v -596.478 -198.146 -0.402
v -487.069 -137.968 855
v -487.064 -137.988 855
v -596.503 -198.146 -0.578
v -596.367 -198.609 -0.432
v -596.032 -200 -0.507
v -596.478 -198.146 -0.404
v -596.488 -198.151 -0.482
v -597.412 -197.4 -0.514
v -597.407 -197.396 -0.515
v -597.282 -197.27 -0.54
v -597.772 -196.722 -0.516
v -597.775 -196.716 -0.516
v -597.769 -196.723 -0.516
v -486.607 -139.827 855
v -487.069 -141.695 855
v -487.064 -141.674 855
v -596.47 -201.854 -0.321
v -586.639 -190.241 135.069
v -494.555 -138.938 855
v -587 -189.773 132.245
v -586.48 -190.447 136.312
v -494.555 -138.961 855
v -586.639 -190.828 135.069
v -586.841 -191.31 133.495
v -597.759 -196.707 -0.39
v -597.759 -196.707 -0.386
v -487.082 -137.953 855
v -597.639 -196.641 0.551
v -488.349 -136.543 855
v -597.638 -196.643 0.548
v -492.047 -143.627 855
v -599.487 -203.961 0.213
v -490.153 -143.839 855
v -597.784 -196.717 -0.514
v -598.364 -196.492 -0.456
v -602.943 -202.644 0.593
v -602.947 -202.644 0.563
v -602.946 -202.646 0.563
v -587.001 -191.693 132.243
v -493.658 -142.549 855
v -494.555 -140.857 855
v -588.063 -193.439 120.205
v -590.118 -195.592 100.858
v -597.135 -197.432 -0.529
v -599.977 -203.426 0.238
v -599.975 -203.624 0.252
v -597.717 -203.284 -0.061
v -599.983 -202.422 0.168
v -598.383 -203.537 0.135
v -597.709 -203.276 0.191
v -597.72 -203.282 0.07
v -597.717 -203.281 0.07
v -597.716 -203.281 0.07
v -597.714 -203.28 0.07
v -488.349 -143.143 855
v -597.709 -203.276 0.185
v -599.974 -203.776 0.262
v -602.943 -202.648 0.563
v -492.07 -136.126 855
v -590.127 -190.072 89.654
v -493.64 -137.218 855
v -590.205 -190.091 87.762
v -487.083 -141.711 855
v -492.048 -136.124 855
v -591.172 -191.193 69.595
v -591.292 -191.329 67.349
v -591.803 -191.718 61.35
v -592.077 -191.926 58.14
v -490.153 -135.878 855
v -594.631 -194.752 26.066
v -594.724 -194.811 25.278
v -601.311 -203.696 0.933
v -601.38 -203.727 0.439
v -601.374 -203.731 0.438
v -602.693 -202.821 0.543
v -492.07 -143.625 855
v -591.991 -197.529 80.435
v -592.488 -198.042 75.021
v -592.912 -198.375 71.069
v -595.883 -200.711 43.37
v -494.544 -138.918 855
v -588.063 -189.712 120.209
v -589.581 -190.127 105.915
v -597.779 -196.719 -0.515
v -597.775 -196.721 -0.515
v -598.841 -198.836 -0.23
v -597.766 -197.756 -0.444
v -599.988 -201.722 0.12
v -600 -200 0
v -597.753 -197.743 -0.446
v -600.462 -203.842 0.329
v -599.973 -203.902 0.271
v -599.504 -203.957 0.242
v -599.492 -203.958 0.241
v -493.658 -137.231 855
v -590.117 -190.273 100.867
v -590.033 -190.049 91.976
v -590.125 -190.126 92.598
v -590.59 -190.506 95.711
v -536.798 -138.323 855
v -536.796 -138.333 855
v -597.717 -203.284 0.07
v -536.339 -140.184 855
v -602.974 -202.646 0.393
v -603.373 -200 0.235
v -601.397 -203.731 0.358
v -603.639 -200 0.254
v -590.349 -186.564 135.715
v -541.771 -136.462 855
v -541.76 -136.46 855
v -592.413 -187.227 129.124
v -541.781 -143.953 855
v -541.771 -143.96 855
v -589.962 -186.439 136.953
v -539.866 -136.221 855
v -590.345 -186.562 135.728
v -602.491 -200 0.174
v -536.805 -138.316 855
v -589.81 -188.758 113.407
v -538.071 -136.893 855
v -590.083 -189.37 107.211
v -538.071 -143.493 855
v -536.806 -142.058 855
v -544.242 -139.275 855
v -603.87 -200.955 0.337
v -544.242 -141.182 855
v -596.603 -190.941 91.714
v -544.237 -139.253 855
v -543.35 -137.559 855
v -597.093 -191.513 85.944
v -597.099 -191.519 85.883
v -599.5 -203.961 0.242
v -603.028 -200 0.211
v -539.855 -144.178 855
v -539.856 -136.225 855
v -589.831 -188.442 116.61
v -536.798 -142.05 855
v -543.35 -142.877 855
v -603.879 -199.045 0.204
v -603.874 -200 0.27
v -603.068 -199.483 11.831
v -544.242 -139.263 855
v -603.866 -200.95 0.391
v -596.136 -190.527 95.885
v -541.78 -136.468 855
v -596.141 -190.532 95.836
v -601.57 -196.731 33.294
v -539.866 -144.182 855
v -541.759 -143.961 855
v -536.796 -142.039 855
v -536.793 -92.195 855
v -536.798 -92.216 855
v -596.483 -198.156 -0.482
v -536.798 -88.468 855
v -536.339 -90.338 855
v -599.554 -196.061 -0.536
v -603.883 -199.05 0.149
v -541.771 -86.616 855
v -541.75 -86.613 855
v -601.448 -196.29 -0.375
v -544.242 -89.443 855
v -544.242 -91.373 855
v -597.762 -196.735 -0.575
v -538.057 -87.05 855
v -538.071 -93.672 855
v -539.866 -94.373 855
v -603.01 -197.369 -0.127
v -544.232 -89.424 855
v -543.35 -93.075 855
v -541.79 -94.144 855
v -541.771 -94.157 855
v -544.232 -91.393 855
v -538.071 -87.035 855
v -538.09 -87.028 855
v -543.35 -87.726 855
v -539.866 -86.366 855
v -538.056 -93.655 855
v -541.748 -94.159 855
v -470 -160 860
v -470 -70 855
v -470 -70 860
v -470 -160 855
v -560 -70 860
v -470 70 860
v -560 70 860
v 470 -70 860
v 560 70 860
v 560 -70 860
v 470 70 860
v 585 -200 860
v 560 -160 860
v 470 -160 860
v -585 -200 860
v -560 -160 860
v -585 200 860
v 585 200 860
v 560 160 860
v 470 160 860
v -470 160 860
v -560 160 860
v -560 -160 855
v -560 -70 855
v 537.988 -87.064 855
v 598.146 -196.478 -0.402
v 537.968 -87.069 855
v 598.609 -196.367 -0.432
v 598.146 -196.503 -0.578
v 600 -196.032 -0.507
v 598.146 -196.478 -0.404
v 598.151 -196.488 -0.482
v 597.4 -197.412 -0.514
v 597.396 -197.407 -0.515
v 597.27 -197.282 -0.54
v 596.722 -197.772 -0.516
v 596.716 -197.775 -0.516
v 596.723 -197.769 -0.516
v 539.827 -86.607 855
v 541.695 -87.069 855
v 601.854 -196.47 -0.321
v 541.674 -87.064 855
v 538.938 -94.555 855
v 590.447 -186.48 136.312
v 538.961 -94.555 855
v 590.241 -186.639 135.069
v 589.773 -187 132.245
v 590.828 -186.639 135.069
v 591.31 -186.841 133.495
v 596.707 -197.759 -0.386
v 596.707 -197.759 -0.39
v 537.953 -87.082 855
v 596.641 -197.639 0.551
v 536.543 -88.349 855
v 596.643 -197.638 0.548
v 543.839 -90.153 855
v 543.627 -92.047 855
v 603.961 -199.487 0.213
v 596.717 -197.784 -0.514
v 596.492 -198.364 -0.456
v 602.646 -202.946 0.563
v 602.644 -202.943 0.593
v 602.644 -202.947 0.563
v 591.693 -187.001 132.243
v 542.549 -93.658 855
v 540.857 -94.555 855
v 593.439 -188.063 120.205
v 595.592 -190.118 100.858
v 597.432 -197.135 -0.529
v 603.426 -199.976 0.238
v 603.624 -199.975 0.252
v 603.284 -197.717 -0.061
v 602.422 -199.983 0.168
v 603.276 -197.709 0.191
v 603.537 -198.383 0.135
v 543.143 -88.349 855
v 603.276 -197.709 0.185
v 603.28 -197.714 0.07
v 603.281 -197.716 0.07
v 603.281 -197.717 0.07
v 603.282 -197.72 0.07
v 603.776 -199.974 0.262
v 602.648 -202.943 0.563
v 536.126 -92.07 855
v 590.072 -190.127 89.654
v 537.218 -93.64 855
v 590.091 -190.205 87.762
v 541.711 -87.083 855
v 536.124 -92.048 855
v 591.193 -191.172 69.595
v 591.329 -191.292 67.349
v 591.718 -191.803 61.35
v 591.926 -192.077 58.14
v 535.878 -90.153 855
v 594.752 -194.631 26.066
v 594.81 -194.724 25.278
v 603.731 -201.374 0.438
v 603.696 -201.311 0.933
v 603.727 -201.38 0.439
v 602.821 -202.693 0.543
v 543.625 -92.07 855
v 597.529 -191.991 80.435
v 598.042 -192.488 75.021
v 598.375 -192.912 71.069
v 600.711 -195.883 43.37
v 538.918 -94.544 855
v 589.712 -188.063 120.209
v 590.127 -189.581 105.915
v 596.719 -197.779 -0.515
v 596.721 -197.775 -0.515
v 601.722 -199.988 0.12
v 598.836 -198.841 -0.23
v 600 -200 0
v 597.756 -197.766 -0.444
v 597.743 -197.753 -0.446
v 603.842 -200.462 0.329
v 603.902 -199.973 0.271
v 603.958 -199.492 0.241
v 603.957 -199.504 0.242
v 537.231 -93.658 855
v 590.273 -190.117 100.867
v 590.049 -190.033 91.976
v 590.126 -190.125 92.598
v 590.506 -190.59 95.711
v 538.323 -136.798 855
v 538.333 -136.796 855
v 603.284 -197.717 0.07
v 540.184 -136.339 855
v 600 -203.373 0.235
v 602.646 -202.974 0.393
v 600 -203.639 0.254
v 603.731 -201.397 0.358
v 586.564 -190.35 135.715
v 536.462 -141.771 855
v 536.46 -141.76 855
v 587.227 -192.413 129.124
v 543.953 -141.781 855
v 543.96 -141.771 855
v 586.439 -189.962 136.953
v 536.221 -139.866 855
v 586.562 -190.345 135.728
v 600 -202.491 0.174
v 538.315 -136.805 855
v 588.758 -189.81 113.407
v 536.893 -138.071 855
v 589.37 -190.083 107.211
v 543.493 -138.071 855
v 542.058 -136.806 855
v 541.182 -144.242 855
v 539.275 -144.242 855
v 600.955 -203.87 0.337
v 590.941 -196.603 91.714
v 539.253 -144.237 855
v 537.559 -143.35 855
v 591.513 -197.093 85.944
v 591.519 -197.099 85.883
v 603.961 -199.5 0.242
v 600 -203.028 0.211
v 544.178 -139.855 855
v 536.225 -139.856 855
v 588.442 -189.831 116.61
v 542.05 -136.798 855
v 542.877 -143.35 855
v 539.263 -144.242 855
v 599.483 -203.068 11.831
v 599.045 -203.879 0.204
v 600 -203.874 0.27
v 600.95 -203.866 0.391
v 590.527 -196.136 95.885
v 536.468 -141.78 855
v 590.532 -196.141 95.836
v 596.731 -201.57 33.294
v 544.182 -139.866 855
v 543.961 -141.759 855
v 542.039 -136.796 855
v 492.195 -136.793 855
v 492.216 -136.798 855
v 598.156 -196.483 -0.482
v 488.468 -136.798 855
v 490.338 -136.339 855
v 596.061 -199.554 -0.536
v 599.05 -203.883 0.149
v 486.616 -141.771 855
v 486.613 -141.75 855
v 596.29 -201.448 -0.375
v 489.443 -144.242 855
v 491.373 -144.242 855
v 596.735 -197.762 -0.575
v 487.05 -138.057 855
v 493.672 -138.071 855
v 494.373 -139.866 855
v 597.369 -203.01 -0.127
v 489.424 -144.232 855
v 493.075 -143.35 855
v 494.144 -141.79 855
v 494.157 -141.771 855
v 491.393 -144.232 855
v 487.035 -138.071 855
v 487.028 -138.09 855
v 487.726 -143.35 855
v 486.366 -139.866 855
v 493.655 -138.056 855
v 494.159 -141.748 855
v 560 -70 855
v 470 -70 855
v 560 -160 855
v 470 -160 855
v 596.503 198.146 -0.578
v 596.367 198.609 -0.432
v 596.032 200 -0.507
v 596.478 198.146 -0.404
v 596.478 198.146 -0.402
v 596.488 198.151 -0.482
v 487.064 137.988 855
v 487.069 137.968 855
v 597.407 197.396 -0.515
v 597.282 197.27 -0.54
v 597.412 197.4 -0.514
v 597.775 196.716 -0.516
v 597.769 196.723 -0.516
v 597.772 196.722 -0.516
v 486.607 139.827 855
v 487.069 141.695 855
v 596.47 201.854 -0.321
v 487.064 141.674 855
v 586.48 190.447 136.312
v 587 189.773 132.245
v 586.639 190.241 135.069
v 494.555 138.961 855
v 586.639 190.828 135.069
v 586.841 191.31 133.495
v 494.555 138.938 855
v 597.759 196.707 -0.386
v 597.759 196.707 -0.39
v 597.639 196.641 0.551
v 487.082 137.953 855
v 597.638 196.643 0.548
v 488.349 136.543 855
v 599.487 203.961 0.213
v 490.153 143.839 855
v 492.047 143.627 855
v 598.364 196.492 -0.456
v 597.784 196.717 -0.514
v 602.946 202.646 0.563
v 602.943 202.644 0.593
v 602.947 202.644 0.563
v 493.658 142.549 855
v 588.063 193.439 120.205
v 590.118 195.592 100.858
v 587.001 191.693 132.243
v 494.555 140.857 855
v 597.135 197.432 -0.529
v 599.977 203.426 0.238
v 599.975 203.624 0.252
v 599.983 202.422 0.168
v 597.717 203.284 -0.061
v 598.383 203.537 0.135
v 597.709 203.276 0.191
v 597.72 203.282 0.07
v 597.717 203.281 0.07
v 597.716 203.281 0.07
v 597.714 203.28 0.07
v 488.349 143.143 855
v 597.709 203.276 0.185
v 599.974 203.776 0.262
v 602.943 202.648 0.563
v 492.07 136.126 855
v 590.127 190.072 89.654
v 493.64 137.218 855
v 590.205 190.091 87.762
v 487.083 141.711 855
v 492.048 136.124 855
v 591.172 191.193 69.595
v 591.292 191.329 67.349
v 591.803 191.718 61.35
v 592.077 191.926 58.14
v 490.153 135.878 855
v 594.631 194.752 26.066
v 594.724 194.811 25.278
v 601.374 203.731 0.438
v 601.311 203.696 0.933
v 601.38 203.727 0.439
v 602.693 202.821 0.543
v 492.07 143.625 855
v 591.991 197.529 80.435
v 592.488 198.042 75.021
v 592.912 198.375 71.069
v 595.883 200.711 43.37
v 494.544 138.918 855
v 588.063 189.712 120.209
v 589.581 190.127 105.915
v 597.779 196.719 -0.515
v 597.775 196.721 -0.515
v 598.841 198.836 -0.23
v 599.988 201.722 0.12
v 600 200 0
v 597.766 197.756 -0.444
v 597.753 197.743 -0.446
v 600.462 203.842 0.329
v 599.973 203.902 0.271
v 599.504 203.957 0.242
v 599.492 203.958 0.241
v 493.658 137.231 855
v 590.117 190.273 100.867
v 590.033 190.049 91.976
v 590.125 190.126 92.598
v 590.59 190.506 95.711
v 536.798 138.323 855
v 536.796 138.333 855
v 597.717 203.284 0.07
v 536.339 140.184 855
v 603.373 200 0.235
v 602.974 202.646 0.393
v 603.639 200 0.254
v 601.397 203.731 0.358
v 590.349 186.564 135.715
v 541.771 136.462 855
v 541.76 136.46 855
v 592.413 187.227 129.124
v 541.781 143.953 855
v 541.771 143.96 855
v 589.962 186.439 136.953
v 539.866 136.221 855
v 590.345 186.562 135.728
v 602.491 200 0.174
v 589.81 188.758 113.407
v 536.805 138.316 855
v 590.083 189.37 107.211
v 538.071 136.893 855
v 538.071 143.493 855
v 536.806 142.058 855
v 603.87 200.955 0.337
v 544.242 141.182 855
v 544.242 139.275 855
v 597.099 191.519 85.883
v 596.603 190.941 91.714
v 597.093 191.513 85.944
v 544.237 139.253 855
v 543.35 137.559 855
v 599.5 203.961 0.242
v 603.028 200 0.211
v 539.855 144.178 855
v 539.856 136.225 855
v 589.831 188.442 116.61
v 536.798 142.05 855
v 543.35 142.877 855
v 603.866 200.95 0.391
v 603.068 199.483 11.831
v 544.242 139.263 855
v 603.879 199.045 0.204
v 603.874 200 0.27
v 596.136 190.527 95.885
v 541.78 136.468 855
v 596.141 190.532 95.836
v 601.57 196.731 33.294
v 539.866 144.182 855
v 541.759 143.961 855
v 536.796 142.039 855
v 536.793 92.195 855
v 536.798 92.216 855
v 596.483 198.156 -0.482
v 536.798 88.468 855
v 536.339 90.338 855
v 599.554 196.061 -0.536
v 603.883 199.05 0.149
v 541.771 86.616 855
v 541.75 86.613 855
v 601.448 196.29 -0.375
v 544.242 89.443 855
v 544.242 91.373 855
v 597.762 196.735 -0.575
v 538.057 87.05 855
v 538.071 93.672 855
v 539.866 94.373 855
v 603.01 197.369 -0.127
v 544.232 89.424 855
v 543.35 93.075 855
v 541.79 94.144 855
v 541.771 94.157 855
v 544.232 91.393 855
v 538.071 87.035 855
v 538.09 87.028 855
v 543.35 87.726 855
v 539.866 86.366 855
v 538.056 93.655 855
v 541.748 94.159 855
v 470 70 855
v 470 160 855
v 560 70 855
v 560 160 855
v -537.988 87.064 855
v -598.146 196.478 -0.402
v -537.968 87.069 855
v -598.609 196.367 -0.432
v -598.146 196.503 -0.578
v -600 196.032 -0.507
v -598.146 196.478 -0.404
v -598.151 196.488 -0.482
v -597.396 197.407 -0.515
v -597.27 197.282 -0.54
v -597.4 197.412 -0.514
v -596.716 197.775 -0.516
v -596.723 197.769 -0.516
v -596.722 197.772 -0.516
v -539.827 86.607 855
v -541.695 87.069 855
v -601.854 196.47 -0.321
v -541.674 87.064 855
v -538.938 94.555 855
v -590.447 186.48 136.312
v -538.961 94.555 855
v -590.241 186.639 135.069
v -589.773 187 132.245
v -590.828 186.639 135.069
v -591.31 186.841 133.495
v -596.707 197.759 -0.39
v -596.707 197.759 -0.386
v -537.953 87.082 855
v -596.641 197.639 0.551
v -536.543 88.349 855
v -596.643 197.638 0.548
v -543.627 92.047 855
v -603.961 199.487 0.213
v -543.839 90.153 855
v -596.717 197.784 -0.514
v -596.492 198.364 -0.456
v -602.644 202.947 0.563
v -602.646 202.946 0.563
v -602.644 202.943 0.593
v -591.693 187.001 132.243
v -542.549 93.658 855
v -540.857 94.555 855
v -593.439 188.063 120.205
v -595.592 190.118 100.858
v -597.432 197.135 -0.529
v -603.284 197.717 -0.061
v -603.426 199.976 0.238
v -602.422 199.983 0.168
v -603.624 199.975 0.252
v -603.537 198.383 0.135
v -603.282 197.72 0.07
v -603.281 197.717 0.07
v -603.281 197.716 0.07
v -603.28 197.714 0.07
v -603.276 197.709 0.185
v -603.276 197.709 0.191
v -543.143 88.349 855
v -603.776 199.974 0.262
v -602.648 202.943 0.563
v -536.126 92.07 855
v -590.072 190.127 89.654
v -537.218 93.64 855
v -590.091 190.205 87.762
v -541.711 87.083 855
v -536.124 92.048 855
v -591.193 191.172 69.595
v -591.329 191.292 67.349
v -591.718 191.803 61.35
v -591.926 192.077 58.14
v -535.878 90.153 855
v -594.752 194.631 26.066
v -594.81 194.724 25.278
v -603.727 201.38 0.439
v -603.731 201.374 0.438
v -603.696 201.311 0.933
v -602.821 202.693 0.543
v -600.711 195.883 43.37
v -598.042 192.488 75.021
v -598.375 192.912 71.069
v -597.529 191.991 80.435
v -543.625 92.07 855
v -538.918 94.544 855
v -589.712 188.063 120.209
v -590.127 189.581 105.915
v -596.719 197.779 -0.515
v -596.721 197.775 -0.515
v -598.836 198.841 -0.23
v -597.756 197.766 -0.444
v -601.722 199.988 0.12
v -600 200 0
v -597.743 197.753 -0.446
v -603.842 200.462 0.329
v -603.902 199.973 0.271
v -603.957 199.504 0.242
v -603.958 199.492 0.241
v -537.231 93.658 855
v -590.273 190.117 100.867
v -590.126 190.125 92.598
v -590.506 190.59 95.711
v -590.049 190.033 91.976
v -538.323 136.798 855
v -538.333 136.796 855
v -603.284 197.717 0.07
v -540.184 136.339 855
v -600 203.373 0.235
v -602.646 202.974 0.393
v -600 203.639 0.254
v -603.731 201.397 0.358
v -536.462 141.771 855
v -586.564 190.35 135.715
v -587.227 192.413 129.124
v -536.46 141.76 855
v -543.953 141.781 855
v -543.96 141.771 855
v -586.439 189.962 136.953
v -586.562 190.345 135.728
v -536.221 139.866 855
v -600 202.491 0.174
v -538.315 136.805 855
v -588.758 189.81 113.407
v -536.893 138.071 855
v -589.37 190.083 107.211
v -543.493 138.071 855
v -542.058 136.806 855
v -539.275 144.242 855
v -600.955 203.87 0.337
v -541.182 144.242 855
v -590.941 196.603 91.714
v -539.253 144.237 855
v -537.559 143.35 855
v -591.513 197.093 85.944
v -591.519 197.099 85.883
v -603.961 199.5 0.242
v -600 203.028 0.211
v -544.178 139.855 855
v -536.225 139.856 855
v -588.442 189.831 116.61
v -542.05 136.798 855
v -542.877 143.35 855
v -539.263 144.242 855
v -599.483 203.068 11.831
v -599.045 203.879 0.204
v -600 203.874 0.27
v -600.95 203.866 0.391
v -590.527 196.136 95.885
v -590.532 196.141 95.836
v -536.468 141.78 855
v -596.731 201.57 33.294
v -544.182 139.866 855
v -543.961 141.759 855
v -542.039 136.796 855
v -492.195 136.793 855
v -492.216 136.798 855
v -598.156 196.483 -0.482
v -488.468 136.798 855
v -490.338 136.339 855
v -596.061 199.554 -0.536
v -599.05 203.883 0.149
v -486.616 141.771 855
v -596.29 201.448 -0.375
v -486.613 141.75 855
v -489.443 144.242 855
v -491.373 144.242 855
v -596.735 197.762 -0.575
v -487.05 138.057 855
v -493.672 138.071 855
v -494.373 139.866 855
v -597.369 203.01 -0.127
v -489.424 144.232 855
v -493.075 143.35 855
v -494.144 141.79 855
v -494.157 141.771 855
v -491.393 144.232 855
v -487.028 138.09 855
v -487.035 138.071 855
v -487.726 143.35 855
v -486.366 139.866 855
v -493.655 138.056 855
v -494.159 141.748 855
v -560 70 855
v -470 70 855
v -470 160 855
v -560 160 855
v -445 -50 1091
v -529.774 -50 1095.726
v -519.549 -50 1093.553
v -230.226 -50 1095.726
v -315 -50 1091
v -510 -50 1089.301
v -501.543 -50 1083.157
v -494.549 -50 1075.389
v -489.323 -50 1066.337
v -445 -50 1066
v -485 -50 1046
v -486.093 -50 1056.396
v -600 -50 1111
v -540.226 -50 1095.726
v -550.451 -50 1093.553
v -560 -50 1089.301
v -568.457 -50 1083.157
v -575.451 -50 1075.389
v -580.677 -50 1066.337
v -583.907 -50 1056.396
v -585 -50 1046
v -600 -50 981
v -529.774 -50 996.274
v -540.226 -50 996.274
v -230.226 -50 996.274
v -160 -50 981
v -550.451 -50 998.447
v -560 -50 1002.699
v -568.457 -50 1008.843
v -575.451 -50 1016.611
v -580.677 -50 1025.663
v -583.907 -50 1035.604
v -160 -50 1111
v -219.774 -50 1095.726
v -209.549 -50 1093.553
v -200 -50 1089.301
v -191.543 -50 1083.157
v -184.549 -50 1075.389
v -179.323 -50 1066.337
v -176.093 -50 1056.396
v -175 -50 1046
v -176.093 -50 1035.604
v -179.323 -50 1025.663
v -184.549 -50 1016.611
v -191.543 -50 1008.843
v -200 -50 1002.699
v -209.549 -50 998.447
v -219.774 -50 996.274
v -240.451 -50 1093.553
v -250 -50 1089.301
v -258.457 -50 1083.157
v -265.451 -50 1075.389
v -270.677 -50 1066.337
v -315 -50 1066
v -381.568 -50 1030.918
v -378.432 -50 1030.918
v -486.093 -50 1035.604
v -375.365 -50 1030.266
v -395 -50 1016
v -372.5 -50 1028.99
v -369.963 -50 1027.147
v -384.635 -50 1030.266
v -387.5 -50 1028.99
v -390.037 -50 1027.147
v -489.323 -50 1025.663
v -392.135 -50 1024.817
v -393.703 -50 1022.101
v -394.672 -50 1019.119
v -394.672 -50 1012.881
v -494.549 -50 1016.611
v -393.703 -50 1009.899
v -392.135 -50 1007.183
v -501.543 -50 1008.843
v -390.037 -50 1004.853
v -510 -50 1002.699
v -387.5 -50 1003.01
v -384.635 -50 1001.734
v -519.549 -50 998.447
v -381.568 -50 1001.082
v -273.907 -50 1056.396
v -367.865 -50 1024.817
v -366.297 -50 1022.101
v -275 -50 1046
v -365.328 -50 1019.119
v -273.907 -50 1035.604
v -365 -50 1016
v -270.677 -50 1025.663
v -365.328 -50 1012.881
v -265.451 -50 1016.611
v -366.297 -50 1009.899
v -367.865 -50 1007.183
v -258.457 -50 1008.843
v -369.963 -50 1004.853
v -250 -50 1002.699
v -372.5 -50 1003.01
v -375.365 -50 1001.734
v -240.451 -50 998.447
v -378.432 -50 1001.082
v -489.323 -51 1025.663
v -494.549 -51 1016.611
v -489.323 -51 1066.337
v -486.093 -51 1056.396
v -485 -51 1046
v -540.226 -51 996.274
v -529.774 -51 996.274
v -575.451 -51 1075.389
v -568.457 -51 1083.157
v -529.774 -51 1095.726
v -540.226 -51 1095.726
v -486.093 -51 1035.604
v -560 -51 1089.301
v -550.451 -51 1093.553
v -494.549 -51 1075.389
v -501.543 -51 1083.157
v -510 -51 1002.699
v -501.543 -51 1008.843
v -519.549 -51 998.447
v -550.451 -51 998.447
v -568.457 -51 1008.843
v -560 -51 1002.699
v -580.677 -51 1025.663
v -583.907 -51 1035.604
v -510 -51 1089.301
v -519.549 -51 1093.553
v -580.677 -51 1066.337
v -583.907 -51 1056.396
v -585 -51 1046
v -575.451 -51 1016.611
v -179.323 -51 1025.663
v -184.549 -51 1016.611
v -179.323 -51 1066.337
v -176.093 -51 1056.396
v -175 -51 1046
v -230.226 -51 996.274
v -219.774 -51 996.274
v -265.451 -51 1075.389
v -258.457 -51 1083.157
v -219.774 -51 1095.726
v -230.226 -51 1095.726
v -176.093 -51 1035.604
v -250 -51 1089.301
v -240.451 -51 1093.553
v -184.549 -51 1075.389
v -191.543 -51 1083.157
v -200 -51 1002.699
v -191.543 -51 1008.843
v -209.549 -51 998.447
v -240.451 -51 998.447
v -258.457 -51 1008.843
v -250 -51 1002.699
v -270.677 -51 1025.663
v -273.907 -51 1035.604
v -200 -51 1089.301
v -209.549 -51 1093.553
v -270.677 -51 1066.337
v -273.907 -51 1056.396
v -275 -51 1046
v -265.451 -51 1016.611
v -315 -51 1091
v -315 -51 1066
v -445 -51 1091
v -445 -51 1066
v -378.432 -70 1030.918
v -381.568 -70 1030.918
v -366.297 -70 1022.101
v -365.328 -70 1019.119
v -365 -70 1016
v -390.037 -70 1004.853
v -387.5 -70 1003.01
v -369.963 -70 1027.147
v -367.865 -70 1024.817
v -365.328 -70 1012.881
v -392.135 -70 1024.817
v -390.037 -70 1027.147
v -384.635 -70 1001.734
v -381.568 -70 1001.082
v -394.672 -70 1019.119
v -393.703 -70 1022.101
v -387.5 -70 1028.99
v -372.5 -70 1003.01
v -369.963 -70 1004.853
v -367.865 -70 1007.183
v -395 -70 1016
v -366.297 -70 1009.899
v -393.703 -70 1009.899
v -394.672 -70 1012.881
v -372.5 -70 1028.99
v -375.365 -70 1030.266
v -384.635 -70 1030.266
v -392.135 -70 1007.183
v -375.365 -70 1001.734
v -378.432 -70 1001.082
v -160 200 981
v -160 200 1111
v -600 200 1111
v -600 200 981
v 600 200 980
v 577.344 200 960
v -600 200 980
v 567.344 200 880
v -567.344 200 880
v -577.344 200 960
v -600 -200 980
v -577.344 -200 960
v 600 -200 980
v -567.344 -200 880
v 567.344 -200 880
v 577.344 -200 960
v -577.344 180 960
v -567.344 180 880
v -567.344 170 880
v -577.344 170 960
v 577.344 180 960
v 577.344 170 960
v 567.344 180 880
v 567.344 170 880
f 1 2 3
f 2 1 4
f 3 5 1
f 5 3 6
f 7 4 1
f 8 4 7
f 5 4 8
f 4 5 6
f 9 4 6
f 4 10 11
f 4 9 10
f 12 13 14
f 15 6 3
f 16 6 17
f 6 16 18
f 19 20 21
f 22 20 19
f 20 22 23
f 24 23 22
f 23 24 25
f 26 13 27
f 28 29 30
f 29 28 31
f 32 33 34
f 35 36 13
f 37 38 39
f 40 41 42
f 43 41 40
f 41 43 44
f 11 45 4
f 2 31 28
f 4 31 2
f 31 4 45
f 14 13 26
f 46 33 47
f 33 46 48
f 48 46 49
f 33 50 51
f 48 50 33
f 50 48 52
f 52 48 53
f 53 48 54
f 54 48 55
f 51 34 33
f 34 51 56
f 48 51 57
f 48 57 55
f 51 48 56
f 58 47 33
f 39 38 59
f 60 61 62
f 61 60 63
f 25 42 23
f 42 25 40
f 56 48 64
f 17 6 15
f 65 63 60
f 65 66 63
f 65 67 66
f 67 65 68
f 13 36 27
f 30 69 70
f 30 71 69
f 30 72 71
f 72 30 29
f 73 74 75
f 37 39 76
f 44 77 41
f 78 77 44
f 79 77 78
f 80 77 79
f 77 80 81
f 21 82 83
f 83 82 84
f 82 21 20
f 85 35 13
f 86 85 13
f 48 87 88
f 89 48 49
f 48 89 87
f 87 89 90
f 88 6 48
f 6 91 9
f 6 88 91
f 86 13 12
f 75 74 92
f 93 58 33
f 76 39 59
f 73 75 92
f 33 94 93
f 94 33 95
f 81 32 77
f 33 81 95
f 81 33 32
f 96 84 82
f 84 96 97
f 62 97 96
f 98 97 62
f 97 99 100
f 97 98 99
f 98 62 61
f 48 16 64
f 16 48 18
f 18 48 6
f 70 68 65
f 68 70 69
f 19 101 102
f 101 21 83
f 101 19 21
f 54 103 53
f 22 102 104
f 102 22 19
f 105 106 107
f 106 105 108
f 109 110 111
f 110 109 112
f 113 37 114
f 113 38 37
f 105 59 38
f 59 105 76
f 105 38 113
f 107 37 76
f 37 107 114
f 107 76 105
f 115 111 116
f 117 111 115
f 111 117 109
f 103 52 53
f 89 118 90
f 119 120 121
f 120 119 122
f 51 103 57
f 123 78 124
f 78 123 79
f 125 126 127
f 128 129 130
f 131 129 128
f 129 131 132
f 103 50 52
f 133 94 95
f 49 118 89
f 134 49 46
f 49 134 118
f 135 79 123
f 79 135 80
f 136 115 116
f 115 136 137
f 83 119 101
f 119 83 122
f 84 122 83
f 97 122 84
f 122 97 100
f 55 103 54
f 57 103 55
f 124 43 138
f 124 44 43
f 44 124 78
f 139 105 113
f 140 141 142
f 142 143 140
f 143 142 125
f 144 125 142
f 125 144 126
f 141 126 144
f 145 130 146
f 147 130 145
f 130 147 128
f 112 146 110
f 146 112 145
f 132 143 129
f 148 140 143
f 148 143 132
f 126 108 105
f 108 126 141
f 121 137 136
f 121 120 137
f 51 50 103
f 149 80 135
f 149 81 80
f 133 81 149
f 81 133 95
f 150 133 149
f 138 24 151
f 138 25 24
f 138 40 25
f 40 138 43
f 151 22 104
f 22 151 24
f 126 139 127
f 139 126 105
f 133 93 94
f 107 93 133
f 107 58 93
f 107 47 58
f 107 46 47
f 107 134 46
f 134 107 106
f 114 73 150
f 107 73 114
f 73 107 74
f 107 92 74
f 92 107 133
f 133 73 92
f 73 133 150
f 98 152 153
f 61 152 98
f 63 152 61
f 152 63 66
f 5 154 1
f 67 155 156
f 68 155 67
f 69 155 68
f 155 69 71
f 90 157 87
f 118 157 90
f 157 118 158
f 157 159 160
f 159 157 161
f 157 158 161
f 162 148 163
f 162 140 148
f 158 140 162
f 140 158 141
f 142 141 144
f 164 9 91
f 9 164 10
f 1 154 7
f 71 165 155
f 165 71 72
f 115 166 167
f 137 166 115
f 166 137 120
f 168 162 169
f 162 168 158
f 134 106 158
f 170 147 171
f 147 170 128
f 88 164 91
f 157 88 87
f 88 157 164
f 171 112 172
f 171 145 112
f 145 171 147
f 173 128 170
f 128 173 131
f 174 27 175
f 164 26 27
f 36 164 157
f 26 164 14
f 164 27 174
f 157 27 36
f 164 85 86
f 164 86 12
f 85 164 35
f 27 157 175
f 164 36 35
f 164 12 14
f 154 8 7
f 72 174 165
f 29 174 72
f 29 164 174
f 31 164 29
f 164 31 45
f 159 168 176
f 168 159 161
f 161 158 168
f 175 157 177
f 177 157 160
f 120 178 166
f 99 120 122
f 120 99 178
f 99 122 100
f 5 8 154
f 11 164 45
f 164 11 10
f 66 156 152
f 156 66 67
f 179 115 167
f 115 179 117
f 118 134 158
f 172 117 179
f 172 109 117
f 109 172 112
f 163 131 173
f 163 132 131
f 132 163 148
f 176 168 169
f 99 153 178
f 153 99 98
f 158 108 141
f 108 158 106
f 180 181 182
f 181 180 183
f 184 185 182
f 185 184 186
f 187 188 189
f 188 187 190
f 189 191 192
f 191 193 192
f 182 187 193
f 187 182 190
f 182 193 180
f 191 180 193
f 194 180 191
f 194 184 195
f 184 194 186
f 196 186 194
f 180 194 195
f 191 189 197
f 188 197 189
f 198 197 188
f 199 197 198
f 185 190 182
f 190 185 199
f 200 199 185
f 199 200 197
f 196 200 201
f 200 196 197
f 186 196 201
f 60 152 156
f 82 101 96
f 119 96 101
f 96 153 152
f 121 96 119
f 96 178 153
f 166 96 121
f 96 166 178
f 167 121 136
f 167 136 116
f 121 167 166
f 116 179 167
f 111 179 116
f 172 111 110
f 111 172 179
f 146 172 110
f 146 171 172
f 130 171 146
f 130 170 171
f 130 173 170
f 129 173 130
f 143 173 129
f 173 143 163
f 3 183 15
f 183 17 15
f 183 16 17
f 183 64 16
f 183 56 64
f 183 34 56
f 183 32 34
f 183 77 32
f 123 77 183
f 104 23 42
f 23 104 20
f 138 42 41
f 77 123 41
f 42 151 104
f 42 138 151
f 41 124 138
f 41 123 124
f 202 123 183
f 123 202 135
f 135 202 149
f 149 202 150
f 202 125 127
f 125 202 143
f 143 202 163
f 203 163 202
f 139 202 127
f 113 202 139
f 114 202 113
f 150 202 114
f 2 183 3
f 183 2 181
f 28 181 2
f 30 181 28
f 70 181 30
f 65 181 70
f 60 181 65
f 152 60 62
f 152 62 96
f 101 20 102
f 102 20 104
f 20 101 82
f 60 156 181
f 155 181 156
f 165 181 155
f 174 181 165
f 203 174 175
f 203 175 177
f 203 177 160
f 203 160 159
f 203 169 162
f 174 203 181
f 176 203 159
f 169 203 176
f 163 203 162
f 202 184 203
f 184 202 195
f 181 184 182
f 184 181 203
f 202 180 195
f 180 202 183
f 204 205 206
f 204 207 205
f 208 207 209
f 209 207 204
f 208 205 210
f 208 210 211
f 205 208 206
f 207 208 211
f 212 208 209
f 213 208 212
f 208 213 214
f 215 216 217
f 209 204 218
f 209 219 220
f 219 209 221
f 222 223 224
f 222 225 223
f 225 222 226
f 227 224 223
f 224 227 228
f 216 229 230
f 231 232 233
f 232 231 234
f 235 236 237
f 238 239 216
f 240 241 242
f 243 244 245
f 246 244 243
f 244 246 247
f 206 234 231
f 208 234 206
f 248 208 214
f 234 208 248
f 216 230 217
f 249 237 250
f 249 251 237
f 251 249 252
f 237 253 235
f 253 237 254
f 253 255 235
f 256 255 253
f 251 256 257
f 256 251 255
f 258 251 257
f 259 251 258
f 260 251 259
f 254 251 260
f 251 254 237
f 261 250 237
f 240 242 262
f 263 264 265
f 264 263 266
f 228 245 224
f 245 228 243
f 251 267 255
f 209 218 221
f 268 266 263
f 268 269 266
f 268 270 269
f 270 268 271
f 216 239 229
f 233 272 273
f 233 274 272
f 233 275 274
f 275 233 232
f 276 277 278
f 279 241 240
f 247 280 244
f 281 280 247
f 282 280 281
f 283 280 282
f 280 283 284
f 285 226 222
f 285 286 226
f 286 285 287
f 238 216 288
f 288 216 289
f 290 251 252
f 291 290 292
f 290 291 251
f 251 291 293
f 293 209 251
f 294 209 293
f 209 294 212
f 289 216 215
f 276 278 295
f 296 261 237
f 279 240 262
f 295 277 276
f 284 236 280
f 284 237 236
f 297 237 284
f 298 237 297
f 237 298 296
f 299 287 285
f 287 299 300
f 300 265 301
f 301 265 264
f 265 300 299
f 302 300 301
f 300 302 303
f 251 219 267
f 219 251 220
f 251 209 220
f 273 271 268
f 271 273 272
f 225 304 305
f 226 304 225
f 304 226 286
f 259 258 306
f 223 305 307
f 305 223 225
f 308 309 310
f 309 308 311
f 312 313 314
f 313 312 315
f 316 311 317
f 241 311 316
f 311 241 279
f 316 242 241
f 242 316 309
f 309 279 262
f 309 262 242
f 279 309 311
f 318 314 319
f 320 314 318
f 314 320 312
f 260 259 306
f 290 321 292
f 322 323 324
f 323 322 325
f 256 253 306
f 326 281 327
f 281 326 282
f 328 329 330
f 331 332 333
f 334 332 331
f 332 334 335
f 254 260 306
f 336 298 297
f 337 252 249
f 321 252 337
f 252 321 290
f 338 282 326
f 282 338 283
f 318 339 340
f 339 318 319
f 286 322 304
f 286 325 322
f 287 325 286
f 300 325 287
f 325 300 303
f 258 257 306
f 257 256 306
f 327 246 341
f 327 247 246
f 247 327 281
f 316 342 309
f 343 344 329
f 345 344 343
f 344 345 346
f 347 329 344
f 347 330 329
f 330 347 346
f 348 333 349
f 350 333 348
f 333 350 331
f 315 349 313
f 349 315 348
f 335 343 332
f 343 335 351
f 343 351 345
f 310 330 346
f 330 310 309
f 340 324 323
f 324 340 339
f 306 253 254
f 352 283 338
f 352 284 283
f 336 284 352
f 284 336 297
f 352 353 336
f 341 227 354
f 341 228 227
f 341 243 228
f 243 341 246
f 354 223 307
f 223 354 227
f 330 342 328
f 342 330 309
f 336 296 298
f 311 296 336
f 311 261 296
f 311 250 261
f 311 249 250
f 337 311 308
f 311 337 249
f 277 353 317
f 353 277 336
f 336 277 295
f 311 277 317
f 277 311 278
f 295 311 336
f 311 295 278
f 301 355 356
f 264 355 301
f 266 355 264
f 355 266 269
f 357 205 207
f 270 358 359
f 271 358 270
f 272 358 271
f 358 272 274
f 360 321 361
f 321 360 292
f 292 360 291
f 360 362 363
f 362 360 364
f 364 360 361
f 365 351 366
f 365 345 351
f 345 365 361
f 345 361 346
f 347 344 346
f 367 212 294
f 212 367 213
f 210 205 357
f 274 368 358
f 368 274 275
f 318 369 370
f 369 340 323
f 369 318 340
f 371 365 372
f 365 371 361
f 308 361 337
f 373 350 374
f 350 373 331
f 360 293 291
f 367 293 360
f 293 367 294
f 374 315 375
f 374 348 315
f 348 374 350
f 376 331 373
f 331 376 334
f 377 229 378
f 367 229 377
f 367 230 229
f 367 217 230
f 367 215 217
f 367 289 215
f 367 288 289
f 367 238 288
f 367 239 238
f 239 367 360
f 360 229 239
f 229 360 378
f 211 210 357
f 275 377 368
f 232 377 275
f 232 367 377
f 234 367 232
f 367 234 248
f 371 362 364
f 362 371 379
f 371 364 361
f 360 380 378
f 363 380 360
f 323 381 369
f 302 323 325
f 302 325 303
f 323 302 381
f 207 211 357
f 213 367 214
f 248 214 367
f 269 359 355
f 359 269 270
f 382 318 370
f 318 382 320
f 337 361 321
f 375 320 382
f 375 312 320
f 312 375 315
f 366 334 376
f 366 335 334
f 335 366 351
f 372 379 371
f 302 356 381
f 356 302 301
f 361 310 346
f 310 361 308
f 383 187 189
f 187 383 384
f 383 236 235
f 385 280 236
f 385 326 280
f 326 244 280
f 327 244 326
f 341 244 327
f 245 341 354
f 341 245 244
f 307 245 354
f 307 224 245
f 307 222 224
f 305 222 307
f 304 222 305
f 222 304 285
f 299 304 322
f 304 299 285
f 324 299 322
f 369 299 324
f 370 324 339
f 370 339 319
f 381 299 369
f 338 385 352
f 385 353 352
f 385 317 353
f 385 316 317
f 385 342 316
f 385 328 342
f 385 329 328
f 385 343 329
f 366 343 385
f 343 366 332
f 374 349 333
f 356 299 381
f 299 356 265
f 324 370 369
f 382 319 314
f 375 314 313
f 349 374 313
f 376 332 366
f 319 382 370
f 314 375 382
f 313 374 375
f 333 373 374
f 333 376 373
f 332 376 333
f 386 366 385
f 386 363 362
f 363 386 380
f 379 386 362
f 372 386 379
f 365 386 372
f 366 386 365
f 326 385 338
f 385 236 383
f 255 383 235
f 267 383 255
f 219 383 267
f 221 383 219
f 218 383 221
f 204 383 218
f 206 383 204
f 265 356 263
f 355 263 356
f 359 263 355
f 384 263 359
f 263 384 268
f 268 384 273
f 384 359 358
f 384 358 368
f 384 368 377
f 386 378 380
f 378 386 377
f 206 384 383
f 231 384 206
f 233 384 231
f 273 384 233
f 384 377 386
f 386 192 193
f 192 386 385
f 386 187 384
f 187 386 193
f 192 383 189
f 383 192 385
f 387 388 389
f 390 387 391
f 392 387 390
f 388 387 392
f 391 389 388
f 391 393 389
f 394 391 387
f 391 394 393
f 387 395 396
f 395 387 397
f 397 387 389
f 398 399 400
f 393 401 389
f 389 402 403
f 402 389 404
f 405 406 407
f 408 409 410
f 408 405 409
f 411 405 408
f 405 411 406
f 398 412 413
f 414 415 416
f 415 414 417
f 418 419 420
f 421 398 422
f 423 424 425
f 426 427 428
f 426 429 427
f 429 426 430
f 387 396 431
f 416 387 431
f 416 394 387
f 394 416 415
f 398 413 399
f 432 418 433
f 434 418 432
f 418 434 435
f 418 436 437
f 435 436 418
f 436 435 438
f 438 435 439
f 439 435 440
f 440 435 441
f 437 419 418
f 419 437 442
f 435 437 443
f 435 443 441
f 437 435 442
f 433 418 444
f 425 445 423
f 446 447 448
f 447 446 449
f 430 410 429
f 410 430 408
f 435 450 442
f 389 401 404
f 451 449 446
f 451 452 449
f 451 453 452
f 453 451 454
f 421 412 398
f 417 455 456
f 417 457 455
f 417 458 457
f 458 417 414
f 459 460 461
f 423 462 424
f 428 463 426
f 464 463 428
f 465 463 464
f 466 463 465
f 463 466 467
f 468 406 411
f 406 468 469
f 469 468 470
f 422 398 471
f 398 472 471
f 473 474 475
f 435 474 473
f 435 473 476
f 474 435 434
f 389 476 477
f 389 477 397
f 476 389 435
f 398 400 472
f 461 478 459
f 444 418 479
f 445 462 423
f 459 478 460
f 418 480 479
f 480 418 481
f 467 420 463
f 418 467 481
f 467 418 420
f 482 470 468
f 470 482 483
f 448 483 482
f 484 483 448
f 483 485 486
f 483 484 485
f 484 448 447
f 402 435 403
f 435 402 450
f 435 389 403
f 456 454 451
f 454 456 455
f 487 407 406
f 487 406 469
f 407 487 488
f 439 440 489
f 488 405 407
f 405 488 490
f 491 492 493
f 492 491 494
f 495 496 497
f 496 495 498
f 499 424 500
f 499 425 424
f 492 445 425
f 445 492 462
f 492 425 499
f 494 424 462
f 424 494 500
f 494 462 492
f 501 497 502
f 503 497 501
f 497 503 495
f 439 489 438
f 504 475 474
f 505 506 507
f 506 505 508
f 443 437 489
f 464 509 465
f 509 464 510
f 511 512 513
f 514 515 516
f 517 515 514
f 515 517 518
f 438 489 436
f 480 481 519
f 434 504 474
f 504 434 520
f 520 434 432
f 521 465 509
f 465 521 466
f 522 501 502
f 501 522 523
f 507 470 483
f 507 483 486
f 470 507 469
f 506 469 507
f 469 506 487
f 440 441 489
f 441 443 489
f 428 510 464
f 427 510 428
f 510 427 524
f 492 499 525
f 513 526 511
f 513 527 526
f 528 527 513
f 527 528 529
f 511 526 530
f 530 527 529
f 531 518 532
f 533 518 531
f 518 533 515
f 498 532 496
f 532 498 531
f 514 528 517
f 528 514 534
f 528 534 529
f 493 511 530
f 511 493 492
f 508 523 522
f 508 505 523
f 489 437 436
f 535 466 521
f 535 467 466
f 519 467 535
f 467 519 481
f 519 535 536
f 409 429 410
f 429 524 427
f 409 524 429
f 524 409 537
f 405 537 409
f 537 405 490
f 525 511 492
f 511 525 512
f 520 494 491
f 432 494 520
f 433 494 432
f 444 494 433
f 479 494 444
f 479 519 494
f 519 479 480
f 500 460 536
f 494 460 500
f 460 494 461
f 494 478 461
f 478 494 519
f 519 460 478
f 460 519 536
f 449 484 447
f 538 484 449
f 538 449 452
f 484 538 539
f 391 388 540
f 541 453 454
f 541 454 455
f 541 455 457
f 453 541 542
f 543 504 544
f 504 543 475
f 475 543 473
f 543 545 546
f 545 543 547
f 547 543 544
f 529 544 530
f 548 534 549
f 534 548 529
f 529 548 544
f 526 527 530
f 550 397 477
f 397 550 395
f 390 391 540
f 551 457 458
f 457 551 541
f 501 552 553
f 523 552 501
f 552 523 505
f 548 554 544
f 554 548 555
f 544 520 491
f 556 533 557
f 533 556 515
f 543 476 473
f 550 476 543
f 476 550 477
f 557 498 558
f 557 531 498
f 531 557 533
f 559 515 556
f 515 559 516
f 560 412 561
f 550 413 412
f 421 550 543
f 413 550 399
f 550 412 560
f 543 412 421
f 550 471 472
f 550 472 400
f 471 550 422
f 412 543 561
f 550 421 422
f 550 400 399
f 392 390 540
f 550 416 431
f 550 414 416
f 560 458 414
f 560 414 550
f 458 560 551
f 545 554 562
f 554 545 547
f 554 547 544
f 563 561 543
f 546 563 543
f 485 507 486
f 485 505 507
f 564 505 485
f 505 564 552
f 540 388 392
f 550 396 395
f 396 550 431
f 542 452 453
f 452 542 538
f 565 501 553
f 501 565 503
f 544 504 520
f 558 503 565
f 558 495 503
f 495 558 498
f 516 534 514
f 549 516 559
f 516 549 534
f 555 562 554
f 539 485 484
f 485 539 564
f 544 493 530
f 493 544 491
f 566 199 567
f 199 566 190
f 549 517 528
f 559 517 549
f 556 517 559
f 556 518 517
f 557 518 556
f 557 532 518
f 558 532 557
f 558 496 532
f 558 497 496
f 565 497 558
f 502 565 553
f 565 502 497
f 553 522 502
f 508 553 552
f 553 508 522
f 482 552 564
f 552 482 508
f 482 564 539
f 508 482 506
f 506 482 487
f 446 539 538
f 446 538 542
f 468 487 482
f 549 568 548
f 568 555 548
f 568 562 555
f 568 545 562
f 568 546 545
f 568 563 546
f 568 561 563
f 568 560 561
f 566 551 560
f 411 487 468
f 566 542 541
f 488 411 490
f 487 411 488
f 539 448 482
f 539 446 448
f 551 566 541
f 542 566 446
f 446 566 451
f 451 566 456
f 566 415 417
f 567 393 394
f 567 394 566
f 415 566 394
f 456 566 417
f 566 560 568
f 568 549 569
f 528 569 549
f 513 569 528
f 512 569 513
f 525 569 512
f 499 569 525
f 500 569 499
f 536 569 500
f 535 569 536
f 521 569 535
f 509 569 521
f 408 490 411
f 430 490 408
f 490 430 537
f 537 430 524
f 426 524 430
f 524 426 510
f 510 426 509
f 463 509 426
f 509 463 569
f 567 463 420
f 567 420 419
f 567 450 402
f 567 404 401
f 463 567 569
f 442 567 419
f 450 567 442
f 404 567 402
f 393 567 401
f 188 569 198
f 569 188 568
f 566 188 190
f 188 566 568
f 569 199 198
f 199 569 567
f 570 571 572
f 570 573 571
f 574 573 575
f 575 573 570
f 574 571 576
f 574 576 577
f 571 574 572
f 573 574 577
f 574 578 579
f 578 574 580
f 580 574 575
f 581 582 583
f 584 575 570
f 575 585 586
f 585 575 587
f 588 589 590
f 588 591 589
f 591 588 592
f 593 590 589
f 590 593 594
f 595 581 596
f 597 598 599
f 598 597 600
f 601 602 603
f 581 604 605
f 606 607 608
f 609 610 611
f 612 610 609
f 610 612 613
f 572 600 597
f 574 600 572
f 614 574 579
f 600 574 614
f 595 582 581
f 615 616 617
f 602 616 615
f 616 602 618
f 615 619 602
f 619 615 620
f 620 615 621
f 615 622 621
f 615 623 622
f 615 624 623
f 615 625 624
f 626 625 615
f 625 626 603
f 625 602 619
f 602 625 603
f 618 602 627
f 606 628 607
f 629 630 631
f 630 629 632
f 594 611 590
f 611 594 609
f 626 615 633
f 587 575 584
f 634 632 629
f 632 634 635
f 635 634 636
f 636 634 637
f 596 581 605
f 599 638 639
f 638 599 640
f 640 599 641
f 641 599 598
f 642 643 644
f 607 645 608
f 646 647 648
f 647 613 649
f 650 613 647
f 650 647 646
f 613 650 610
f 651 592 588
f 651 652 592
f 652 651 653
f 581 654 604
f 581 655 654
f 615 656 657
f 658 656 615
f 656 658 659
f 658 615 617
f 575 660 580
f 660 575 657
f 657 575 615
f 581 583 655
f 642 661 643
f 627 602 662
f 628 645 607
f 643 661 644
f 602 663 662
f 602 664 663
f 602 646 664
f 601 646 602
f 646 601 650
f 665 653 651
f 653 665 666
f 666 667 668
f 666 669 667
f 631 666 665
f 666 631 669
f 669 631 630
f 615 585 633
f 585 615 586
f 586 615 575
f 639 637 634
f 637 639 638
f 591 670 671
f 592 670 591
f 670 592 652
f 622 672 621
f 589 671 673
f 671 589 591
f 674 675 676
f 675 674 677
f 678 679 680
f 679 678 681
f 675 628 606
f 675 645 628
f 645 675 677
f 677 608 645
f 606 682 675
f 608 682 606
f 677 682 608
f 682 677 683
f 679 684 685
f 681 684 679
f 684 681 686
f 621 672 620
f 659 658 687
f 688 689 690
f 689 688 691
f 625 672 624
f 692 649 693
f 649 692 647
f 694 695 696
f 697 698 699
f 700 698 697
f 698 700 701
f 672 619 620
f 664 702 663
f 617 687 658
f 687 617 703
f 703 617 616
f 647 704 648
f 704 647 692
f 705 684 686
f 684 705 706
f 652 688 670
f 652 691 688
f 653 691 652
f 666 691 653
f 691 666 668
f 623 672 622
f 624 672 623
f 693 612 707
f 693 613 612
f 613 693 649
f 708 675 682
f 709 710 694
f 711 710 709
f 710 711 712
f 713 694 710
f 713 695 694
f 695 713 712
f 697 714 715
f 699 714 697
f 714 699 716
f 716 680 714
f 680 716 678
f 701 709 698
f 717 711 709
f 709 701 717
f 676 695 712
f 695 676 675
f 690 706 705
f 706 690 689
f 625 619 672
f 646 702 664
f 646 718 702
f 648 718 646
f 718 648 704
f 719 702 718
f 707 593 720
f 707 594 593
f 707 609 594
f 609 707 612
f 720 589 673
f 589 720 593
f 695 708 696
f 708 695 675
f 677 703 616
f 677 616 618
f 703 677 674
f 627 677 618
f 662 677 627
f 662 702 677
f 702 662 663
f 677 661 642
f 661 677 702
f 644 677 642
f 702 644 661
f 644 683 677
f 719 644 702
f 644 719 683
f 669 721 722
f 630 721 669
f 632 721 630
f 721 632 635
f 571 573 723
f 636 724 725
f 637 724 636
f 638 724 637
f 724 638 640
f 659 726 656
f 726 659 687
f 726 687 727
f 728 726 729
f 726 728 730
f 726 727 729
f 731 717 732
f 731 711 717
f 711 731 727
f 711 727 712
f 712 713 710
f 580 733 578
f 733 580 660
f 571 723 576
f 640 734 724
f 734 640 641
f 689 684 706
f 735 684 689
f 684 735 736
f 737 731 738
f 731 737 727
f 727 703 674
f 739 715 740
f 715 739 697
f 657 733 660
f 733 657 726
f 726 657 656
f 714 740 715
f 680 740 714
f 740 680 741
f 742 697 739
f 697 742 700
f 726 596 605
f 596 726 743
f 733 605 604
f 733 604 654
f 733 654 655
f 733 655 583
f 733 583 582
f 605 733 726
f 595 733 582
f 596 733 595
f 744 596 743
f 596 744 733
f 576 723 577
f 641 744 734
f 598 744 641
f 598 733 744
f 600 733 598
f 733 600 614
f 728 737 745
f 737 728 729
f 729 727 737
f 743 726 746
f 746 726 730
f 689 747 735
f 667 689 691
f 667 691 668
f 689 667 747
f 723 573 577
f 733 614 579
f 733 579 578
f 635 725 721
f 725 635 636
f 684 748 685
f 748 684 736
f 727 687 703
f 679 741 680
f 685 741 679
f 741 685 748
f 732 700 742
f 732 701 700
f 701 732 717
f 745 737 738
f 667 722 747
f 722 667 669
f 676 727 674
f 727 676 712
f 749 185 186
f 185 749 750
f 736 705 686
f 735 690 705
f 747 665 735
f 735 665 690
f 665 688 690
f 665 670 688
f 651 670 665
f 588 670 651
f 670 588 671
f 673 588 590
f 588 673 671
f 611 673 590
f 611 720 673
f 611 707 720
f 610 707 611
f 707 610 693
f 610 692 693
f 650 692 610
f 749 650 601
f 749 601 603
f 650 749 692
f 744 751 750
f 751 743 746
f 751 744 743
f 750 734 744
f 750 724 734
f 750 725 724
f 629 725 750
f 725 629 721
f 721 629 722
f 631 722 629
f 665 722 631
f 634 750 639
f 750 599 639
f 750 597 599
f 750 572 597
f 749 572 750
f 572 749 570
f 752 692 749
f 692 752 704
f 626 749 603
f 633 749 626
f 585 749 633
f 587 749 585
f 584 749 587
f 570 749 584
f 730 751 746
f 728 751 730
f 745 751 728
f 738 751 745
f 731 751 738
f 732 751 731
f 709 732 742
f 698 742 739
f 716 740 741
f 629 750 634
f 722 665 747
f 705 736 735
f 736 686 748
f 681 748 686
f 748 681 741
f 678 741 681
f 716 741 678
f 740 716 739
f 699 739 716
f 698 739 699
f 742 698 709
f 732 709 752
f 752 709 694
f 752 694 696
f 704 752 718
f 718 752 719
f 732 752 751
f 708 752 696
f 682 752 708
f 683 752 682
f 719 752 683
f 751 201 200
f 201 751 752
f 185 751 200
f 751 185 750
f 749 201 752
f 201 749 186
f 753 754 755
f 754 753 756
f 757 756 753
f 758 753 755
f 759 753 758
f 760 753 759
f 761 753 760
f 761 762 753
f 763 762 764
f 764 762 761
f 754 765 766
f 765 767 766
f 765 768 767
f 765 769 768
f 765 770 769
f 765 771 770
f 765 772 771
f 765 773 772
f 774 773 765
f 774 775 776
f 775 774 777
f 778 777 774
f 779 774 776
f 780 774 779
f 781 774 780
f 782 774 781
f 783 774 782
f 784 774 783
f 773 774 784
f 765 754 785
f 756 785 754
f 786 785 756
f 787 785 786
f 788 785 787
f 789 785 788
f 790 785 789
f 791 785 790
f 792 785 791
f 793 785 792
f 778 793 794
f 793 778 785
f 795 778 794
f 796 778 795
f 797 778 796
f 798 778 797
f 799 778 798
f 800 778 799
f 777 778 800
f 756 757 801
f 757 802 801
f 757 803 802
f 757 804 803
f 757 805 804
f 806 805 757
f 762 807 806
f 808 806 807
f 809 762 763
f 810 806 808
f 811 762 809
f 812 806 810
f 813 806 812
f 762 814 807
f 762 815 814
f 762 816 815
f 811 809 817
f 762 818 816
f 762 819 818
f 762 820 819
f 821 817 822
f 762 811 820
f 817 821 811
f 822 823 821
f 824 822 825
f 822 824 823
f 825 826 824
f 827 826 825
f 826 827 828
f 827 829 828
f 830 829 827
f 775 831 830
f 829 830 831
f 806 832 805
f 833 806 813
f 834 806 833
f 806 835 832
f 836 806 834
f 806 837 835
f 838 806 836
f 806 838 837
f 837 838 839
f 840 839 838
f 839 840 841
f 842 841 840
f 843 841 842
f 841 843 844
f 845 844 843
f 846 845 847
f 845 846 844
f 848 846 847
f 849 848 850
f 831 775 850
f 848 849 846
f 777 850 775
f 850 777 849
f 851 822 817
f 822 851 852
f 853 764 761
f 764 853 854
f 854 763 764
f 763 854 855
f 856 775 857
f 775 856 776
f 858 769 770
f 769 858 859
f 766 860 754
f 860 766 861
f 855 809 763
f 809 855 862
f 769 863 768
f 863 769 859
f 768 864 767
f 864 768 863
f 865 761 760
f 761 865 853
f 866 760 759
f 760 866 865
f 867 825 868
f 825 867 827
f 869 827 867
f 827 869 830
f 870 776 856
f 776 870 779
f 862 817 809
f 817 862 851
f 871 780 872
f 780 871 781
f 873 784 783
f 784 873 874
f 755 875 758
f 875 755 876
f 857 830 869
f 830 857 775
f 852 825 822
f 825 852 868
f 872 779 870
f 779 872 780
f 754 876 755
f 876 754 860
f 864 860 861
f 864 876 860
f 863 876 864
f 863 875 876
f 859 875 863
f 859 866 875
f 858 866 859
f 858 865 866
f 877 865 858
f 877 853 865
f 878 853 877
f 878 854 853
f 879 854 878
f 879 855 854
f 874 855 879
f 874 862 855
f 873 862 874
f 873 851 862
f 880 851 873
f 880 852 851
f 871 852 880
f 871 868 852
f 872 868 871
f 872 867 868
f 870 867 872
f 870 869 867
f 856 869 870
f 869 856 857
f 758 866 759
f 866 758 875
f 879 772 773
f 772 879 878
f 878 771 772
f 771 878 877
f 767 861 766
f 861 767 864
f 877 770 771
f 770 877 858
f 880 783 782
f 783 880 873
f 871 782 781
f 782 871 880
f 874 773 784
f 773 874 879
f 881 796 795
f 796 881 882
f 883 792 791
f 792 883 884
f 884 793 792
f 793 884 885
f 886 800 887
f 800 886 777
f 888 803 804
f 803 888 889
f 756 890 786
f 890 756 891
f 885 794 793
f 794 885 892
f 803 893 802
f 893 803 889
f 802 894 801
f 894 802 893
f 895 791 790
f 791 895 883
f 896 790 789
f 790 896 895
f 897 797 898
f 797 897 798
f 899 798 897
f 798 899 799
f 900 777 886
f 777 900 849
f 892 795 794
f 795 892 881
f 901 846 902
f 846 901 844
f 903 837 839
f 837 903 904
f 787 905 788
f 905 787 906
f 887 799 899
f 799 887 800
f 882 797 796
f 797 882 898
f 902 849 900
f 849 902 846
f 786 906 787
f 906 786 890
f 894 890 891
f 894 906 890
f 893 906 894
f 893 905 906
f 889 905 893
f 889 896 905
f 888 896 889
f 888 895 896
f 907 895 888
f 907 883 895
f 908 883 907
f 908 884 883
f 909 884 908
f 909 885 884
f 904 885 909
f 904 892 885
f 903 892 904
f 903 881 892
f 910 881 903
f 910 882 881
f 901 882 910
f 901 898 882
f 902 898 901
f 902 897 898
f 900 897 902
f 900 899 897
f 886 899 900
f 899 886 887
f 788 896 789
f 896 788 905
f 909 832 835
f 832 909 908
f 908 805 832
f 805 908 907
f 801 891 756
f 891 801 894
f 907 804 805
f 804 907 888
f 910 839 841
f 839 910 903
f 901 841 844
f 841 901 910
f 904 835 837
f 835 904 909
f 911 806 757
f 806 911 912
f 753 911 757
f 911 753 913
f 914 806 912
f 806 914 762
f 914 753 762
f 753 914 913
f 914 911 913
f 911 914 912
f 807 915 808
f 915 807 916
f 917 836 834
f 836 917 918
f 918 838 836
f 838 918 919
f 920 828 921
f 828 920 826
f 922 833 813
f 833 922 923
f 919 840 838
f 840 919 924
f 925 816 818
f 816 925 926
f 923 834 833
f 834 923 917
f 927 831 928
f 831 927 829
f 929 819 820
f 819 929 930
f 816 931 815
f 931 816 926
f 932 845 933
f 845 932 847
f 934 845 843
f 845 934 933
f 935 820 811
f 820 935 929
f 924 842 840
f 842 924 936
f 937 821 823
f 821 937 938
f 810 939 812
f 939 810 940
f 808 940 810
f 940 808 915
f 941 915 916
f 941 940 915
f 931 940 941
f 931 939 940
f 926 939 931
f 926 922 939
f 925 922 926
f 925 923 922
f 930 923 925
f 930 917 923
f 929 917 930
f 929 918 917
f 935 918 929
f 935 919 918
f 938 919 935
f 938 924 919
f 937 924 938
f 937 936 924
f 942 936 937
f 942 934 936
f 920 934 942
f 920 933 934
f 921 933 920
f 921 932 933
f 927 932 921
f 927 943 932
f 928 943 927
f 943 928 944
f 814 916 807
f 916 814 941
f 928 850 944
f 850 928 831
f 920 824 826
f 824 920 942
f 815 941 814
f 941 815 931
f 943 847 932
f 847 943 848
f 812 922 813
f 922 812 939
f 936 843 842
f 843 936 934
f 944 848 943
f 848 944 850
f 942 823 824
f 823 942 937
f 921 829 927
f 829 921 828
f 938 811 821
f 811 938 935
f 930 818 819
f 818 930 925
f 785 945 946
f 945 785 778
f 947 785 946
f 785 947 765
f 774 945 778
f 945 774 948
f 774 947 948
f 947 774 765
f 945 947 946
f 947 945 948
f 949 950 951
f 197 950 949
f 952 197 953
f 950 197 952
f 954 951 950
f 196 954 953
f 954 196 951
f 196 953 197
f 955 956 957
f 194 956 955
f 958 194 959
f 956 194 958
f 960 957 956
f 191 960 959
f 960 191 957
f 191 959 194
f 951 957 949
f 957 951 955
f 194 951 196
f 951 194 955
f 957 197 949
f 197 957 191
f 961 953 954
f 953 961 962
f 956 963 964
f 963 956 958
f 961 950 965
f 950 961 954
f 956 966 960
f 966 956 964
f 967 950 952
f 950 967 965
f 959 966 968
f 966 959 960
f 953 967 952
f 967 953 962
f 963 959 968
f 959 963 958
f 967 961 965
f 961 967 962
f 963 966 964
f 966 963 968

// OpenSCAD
/****************************************************\
Mid Century modern table
(C) P. Bauermeister, 2018-06-21.
\****************************************************/


BODY_LENGTH = 1200;
BODY_WIDTH = 400;
BODY_HEIGHT = 120;
BODY_BOTTOM_RECESS = 10*1.5;
PLANK_THICKNESS = 20;

LEG_HEIGHT = 860;
LEG_PIN_DIAMETER = 8;
LEG_PIN_DISPLACEMENT = 60;
LEG_PIN_SPACING = 50;
LEG_PLATE_MARGIN = 20;
LEG_PLATE_THICKNESS = 5;

BACK_THICKNESS = 10;
BACK_HOLE_DIAMETER = 50;
BACK_HOLE_NB = 10 *0;

inner_height = BODY_HEIGHT-PLANK_THICKNESS*2;
echo("recess=", BODY_BOTTOM_RECESS);
angle = atan(BODY_BOTTOM_RECESS/BODY_HEIGHT);
echo("angle=", angle);
sl = inner_height / cos(angle);
echo("side_length=", sl);

module BodyFaceTrapeze() {
    translate([-BODY_LENGTH/2, 0, 0])
    polygon(points=[
        [0, BODY_HEIGHT],
        [BODY_LENGTH, BODY_HEIGHT],
        [BODY_LENGTH-BODY_BOTTOM_RECESS, 0],
        [BODY_BOTTOM_RECESS, 0]
    ]);
}

module Back() {
    rotate([90, 0, 0])
    linear_extrude(height=BACK_THICKNESS)
    difference() {
        offset(r=-PLANK_THICKNESS) BodyFaceTrapeze();
        if (BACK_HOLE_NB)
        for (i=[0:BACK_HOLE_NB-1]) {
            d = BODY_LENGTH/(BACK_HOLE_NB+0.5);
            x = (i-BACK_HOLE_NB/2+.5) * d;
            translate([x, BODY_HEIGHT/2, 0])
            circle(d=BACK_HOLE_DIAMETER);
            
            }
    }
}

module Body() {
    translate([0, BODY_WIDTH/2, 0])
    rotate([90, 0, 0])
    linear_extrude(height=BODY_WIDTH)
    difference() {
        BodyFaceTrapeze(false);
        offset(r=-PLANK_THICKNESS) BodyFaceTrapeze(false);
    }
}

module Leg() {
    d1 = LEG_PIN_DISPLACEMENT+LEG_PIN_SPACING;
    d2 = LEG_PIN_DISPLACEMENT;
    alpha = atan((d1)/LEG_HEIGHT);
    beta = atan((LEG_PIN_DISPLACEMENT)/LEG_HEIGHT);
    l1 = sqrt(LEG_HEIGHT*LEG_HEIGHT + d1*d1 *2);
    l2 = sqrt(LEG_HEIGHT*LEG_HEIGHT + d2*d2 *2);

    union() {
        rotate([-beta, alpha, 0])
        cylinder(h=l1, d=LEG_PIN_DIAMETER);

        rotate([-beta, beta, 0])
        cylinder(h=l2, d=LEG_PIN_DIAMETER);

        rotate([-alpha, beta, 0])
        cylinder(h=l1, d=LEG_PIN_DIAMETER);
    }
    
    c = LEG_PIN_SPACING + LEG_PLATE_MARGIN * 2;
    d = LEG_PIN_DISPLACEMENT+LEG_PIN_SPACING/2-c/2;
    translate([d, d, LEG_HEIGHT-LEG_PLATE_THICKNESS])
    difference() {
        cube([c, c, LEG_PLATE_THICKNESS]);
        //translate([c/2, c/2, 0]) cube([c, c, LEG_PLATE_THICKNESS]);
    }
}

module Stereo() {
    l = 440; w= 250; h= 130;
    color("Maroon")
    translate([0, -w, 0])
    cube([l, w, h]);
    
    color("black") {
        d=100; o = 15;
        translate([d/2+o, -w, d/2 + (h-d)/2])
        rotate([90, 0, 0]) cylinder(d=d);
        translate([l-(d/2+o), -w, d/2 + (h-d)/2])
        rotate([90, 0, 0]) cylinder(d=d);

        ll = 130; hh = 25;
        translate([l/2-ll/2, -w-1, h-hh-20])
        cube([ll, 1, hh]);

        d3 = 30;
        translate([l/2, -w, d3/2+20])
        rotate([90, 0, 0]) cylinder(d=d3, h=20);

    }

}


translate([0, 0, LEG_HEIGHT])
color("peru")
color("chocolate")
color("sienna")
Body();

translate([0, BODY_WIDTH/2 - PLANK_THICKNESS, LEG_HEIGHT])
color("chocolate")
Back();

translate([-BODY_LENGTH/2, -BODY_WIDTH/2, 0])
color("white")
Leg();

translate([BODY_LENGTH/2, -BODY_WIDTH/2, 0])
rotate([0, 0, 90])
color("white")
Leg();

translate([BODY_LENGTH/2, BODY_WIDTH/2, 0])
rotate([0, 0, 180])
color("white")
Leg();

translate([-BODY_LENGTH/2, BODY_WIDTH/2, 0])
rotate([0, 0, -90])
color("white")
Leg();

translate([-BODY_LENGTH/2, BODY_WIDTH/2, LEG_HEIGHT+BODY_HEIGHT+1])
Stereo();

%cube([2000, 2000, 1], true);
